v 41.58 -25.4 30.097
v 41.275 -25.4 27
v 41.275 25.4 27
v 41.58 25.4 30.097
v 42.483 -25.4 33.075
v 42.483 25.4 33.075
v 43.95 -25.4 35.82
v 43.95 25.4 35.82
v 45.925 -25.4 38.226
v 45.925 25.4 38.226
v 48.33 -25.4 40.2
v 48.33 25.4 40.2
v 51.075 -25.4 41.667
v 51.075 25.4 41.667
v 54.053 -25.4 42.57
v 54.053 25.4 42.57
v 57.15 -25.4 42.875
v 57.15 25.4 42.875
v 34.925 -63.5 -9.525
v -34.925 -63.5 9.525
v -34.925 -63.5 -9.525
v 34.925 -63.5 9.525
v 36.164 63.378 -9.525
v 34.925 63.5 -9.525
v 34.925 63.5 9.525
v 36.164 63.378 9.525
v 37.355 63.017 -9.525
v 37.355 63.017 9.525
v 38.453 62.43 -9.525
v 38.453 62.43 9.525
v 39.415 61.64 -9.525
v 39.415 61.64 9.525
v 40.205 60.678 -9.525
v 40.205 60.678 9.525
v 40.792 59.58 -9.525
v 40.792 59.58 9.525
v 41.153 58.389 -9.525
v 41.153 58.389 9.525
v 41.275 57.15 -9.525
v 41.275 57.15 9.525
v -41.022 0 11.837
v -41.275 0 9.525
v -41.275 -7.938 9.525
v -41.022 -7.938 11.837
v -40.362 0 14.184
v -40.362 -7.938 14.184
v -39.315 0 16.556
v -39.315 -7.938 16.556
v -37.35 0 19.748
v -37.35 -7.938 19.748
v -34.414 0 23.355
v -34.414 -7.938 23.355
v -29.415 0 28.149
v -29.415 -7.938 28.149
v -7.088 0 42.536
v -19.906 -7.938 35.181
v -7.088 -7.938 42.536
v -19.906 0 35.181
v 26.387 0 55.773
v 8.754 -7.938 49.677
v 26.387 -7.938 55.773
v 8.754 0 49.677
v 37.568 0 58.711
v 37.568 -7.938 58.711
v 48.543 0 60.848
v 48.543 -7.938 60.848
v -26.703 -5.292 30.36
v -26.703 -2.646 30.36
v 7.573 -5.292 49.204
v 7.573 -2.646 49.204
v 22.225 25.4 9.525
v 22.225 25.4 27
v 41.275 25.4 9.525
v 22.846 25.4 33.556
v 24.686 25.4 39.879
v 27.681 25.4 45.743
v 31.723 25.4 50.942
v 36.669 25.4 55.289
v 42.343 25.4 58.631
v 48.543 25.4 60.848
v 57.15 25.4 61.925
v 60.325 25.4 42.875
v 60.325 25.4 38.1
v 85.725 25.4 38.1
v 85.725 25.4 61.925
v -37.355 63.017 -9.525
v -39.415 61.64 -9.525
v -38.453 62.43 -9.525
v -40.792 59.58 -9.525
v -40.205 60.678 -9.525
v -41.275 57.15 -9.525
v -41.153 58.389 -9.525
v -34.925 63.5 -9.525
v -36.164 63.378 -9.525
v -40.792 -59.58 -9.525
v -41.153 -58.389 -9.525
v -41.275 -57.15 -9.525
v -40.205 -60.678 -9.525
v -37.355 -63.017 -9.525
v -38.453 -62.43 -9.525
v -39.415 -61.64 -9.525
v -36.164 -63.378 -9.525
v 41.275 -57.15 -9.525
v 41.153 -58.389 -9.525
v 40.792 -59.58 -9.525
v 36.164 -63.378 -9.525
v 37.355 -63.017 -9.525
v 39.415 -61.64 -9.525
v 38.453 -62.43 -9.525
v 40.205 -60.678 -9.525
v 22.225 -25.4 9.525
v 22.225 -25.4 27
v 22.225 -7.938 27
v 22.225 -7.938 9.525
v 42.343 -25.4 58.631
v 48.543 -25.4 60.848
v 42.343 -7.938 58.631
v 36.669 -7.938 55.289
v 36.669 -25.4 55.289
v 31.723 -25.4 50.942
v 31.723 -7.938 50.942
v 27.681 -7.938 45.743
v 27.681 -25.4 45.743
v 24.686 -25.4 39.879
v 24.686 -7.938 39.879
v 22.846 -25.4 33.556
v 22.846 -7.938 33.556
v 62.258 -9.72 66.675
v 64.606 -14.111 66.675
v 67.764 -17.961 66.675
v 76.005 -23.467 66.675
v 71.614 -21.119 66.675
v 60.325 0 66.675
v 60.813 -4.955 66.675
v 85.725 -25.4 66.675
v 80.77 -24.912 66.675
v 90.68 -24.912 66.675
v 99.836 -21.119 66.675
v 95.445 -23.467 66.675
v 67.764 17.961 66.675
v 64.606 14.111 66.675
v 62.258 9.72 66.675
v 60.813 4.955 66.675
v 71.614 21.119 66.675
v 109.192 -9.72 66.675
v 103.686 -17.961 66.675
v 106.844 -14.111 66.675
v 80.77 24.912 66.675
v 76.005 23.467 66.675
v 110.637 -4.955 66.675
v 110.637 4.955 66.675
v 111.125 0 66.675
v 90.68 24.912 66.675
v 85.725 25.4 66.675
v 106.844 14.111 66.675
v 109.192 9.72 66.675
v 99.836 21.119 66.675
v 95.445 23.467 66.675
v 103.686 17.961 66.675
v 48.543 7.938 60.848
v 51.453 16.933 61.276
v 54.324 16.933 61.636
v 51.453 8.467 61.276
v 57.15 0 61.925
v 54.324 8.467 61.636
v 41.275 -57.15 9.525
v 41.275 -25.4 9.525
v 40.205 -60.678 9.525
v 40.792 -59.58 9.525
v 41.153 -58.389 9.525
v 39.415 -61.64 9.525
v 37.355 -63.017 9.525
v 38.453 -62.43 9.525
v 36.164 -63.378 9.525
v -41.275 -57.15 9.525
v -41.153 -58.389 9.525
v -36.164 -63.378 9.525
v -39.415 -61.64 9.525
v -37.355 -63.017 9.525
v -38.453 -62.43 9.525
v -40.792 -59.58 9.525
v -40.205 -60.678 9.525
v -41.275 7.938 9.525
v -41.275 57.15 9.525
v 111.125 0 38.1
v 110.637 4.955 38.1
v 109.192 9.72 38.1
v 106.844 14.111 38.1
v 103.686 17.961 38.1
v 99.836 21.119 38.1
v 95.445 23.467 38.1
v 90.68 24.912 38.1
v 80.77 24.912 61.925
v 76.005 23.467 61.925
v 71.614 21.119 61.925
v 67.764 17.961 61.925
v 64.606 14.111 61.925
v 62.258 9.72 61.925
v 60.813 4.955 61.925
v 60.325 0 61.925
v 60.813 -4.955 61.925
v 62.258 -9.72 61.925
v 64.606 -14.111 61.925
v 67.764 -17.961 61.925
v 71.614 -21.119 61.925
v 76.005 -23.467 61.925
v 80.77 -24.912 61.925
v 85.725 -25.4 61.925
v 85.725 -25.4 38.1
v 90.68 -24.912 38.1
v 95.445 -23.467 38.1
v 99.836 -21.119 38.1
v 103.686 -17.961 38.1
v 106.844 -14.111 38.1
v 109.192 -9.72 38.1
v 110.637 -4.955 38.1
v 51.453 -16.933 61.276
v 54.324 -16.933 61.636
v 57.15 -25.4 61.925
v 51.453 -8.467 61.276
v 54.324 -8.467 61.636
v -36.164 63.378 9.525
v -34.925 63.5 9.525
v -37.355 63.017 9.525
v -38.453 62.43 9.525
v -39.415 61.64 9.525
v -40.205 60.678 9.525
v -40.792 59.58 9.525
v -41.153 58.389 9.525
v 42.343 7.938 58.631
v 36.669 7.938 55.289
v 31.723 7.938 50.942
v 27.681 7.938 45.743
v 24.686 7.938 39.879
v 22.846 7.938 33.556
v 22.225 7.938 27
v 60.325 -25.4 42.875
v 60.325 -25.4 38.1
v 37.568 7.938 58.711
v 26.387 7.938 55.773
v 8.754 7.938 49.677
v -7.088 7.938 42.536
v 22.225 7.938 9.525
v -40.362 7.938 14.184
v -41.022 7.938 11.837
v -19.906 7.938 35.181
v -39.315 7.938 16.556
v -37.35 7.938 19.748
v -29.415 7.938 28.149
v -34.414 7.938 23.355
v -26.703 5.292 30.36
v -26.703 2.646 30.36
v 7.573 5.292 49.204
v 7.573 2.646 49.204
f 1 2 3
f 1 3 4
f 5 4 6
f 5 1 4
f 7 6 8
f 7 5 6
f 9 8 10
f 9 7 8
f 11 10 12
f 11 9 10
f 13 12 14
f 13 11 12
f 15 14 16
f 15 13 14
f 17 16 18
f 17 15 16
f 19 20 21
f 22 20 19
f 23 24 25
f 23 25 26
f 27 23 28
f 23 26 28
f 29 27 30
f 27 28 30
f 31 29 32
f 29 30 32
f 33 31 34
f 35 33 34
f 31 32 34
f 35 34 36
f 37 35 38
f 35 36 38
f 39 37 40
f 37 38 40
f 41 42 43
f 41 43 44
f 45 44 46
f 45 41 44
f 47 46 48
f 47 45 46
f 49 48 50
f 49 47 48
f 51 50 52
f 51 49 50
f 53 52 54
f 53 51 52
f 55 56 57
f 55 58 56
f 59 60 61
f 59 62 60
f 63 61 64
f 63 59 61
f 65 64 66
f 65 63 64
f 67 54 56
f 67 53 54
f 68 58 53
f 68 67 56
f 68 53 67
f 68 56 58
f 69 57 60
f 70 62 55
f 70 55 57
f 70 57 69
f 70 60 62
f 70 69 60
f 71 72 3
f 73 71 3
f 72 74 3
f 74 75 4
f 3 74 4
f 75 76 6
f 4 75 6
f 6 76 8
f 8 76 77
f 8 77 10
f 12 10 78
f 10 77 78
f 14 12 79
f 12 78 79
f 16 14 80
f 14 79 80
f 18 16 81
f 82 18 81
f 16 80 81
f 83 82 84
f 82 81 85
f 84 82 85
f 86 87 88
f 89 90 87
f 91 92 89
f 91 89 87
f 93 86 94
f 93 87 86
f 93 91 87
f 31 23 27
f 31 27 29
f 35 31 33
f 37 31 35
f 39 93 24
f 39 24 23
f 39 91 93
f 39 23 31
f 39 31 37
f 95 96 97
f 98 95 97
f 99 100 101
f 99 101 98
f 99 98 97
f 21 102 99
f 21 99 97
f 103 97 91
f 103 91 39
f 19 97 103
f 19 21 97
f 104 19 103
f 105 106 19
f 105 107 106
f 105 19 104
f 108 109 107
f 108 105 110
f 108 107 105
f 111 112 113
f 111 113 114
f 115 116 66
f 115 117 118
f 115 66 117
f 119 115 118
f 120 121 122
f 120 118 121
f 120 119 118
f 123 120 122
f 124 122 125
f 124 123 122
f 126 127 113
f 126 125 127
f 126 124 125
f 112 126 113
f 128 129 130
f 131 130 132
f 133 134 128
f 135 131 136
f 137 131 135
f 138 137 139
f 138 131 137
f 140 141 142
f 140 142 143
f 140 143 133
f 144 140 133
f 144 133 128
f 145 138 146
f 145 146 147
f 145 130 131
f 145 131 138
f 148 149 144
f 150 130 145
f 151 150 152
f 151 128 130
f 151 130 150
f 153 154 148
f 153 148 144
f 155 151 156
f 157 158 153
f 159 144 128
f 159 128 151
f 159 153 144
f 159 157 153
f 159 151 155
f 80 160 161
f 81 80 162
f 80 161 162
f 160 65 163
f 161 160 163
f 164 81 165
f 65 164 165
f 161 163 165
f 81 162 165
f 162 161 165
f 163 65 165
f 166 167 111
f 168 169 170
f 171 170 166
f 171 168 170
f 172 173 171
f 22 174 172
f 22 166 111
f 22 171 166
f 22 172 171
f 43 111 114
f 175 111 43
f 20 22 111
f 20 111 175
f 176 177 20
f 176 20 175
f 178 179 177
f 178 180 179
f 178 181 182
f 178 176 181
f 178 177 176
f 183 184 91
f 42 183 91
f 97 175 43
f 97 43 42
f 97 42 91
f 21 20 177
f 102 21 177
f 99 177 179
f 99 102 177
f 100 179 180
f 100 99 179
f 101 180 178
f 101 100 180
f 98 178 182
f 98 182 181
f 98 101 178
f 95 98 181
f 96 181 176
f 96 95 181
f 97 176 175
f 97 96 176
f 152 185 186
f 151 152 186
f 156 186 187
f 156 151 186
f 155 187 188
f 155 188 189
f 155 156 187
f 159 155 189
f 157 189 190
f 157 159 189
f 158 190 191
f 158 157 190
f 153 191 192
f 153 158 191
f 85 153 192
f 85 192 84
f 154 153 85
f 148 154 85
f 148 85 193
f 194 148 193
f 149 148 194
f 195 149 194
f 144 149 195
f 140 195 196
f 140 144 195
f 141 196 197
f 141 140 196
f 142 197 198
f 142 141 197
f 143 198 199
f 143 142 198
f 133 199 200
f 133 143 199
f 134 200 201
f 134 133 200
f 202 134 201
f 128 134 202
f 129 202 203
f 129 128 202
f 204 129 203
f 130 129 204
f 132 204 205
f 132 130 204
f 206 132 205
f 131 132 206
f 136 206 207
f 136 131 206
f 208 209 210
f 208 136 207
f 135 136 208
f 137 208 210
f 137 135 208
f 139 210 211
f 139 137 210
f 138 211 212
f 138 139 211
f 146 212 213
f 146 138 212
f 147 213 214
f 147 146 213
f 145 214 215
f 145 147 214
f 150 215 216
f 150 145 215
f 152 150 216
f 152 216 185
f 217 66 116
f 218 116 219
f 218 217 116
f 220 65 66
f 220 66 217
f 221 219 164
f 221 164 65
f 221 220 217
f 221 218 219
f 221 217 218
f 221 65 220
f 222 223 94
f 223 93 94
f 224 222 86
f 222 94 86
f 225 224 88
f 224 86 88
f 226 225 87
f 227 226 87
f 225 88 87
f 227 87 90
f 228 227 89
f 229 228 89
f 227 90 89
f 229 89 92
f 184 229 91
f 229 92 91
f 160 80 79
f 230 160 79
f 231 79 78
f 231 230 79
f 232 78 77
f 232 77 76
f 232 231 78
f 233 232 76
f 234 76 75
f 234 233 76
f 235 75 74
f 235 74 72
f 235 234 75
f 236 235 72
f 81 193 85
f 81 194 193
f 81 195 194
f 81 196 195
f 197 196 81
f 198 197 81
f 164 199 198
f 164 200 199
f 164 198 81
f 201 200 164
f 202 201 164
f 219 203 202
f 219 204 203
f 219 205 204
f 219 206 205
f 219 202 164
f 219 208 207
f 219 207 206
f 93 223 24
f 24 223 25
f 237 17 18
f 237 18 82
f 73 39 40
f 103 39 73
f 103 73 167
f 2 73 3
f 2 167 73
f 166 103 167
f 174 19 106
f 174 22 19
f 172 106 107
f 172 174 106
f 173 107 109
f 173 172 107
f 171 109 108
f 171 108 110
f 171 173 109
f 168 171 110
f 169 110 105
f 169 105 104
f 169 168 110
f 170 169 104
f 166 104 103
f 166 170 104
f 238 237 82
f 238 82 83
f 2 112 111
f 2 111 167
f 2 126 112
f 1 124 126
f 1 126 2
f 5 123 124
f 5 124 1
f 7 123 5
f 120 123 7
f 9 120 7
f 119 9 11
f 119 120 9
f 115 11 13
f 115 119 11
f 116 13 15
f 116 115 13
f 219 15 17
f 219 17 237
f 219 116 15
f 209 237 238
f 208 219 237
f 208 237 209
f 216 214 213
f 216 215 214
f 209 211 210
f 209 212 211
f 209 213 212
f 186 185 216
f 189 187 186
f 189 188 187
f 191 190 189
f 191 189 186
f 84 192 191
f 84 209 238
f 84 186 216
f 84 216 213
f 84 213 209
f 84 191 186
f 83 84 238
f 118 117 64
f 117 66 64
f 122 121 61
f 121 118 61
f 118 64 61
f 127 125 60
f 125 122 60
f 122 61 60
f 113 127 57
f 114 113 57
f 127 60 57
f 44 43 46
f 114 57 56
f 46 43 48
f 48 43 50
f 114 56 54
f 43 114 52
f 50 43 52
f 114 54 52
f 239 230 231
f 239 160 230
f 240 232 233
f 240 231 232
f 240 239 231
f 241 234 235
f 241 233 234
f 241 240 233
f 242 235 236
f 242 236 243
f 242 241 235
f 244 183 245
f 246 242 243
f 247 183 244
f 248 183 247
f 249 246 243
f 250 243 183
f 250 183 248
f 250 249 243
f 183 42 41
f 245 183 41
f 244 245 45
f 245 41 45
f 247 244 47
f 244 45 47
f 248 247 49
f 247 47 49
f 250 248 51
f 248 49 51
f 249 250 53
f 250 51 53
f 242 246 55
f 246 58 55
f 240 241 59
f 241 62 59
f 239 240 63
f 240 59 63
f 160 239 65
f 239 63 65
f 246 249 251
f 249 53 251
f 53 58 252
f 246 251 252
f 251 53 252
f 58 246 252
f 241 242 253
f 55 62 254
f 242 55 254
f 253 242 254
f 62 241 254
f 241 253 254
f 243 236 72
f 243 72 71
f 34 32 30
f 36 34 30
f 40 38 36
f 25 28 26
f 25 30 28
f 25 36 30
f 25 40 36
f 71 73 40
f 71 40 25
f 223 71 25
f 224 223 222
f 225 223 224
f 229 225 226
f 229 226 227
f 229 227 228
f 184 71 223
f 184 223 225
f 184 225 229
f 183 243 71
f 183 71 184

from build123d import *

# Parameters (mm, degrees)
F1_DEPTH = 63.5
F2_DEPTH = 25.4
F3_DEPTH = 7.9375
F5_R     = 6.35


with BuildPart() as f1:
    # F0 (on Front) → F1 (new body, symmetric)
    with BuildSketch(Plane.XZ):
        Polygon((22.225, 9.525), (-41.275, 9.525), (-41.275, -9.525), (41.275, -9.525), (41.275, 9.525), align=None)
    extrude(amount=F1_DEPTH, both=True)

    # F0 (on Front) → F2 (join, symmetric)
    with BuildSketch(Plane.XZ):
        with BuildLine():
            Line((22.225, 27.0002), (22.225, 9.525))
            Line((22.225, 9.525), (41.275, 9.525))
            Line((41.275, 9.525), (41.275, 27.0002))
            ThreePointArc((41.275, 27.0002), (45.92468, 38.22552), (57.15, 42.8752))
            Line((57.15, 42.8752), (60.325, 42.8752))
            Line((60.325, 42.8752), (60.325, 61.9252))
            Line((60.325, 61.9252), (57.15, 61.9252))
            add(Edge.make_bspline(
                [(48.54343, 60.848133), (51.47075, 61.31001), (54.347268, 61.6721), (57.15, 61.9252)],
                knots=[103.89725, 103.89725, 103.89725, 103.89725, 111.504536, 111.504536, 111.504536, 111.504536], degree=3))
            ThreePointArc((48.54343, 60.848133), (29.578819, 48.438147), (22.225, 27.0002))
        make_face()
        Polygon((85.725, 61.9252), (60.325, 61.9252), (60.325, 42.8752), (60.325, 38.1), (85.725, 38.1), align=None)
    extrude(amount=F2_DEPTH, both=True)

    # F0 (on Front) → F3 (join, symmetric)
    with BuildSketch(Plane.XZ):
        with BuildLine():
            add(Edge.make_bspline(
                [(-41.275, 9.525), (-40.893038, 29.61845), (8.563274, 54.539999), (48.54343, 60.848133)],
                knots=[0, 0, 0, 0, 103.89725, 103.89725, 103.89725, 103.89725], degree=3))
            Line((-41.275, 9.525), (22.225, 9.525))
            Line((22.225, 9.525), (22.225, 27.0002))
            ThreePointArc((22.225, 27.0002), (29.578819, 48.438147), (48.54343, 60.848133))
        make_face()
    extrude(amount=F3_DEPTH, both=True)

    # F0 (on Front) → F4 (revolve)
    with BuildSketch(Plane.XZ):
        Polygon((85.725, 66.675), (85.725, 61.9252), (85.725, 38.1), (111.125, 38.1), (111.125, 66.675), align=None)
    revolve(axis=Axis((85.725, 0, 52.3875), (0, 0, 1)))

    # F5
    f5_edges = [f1.edges().sort_by_distance(p)[0] for p in [
        (-41.275, -63.5, 0),
        (41.275, -63.5, 0),
        (41.275, 63.5, 0),
        (-41.275, 63.5, 0),
    ]]
    fillet(f5_edges, radius=F5_R)


solid = f1.part
